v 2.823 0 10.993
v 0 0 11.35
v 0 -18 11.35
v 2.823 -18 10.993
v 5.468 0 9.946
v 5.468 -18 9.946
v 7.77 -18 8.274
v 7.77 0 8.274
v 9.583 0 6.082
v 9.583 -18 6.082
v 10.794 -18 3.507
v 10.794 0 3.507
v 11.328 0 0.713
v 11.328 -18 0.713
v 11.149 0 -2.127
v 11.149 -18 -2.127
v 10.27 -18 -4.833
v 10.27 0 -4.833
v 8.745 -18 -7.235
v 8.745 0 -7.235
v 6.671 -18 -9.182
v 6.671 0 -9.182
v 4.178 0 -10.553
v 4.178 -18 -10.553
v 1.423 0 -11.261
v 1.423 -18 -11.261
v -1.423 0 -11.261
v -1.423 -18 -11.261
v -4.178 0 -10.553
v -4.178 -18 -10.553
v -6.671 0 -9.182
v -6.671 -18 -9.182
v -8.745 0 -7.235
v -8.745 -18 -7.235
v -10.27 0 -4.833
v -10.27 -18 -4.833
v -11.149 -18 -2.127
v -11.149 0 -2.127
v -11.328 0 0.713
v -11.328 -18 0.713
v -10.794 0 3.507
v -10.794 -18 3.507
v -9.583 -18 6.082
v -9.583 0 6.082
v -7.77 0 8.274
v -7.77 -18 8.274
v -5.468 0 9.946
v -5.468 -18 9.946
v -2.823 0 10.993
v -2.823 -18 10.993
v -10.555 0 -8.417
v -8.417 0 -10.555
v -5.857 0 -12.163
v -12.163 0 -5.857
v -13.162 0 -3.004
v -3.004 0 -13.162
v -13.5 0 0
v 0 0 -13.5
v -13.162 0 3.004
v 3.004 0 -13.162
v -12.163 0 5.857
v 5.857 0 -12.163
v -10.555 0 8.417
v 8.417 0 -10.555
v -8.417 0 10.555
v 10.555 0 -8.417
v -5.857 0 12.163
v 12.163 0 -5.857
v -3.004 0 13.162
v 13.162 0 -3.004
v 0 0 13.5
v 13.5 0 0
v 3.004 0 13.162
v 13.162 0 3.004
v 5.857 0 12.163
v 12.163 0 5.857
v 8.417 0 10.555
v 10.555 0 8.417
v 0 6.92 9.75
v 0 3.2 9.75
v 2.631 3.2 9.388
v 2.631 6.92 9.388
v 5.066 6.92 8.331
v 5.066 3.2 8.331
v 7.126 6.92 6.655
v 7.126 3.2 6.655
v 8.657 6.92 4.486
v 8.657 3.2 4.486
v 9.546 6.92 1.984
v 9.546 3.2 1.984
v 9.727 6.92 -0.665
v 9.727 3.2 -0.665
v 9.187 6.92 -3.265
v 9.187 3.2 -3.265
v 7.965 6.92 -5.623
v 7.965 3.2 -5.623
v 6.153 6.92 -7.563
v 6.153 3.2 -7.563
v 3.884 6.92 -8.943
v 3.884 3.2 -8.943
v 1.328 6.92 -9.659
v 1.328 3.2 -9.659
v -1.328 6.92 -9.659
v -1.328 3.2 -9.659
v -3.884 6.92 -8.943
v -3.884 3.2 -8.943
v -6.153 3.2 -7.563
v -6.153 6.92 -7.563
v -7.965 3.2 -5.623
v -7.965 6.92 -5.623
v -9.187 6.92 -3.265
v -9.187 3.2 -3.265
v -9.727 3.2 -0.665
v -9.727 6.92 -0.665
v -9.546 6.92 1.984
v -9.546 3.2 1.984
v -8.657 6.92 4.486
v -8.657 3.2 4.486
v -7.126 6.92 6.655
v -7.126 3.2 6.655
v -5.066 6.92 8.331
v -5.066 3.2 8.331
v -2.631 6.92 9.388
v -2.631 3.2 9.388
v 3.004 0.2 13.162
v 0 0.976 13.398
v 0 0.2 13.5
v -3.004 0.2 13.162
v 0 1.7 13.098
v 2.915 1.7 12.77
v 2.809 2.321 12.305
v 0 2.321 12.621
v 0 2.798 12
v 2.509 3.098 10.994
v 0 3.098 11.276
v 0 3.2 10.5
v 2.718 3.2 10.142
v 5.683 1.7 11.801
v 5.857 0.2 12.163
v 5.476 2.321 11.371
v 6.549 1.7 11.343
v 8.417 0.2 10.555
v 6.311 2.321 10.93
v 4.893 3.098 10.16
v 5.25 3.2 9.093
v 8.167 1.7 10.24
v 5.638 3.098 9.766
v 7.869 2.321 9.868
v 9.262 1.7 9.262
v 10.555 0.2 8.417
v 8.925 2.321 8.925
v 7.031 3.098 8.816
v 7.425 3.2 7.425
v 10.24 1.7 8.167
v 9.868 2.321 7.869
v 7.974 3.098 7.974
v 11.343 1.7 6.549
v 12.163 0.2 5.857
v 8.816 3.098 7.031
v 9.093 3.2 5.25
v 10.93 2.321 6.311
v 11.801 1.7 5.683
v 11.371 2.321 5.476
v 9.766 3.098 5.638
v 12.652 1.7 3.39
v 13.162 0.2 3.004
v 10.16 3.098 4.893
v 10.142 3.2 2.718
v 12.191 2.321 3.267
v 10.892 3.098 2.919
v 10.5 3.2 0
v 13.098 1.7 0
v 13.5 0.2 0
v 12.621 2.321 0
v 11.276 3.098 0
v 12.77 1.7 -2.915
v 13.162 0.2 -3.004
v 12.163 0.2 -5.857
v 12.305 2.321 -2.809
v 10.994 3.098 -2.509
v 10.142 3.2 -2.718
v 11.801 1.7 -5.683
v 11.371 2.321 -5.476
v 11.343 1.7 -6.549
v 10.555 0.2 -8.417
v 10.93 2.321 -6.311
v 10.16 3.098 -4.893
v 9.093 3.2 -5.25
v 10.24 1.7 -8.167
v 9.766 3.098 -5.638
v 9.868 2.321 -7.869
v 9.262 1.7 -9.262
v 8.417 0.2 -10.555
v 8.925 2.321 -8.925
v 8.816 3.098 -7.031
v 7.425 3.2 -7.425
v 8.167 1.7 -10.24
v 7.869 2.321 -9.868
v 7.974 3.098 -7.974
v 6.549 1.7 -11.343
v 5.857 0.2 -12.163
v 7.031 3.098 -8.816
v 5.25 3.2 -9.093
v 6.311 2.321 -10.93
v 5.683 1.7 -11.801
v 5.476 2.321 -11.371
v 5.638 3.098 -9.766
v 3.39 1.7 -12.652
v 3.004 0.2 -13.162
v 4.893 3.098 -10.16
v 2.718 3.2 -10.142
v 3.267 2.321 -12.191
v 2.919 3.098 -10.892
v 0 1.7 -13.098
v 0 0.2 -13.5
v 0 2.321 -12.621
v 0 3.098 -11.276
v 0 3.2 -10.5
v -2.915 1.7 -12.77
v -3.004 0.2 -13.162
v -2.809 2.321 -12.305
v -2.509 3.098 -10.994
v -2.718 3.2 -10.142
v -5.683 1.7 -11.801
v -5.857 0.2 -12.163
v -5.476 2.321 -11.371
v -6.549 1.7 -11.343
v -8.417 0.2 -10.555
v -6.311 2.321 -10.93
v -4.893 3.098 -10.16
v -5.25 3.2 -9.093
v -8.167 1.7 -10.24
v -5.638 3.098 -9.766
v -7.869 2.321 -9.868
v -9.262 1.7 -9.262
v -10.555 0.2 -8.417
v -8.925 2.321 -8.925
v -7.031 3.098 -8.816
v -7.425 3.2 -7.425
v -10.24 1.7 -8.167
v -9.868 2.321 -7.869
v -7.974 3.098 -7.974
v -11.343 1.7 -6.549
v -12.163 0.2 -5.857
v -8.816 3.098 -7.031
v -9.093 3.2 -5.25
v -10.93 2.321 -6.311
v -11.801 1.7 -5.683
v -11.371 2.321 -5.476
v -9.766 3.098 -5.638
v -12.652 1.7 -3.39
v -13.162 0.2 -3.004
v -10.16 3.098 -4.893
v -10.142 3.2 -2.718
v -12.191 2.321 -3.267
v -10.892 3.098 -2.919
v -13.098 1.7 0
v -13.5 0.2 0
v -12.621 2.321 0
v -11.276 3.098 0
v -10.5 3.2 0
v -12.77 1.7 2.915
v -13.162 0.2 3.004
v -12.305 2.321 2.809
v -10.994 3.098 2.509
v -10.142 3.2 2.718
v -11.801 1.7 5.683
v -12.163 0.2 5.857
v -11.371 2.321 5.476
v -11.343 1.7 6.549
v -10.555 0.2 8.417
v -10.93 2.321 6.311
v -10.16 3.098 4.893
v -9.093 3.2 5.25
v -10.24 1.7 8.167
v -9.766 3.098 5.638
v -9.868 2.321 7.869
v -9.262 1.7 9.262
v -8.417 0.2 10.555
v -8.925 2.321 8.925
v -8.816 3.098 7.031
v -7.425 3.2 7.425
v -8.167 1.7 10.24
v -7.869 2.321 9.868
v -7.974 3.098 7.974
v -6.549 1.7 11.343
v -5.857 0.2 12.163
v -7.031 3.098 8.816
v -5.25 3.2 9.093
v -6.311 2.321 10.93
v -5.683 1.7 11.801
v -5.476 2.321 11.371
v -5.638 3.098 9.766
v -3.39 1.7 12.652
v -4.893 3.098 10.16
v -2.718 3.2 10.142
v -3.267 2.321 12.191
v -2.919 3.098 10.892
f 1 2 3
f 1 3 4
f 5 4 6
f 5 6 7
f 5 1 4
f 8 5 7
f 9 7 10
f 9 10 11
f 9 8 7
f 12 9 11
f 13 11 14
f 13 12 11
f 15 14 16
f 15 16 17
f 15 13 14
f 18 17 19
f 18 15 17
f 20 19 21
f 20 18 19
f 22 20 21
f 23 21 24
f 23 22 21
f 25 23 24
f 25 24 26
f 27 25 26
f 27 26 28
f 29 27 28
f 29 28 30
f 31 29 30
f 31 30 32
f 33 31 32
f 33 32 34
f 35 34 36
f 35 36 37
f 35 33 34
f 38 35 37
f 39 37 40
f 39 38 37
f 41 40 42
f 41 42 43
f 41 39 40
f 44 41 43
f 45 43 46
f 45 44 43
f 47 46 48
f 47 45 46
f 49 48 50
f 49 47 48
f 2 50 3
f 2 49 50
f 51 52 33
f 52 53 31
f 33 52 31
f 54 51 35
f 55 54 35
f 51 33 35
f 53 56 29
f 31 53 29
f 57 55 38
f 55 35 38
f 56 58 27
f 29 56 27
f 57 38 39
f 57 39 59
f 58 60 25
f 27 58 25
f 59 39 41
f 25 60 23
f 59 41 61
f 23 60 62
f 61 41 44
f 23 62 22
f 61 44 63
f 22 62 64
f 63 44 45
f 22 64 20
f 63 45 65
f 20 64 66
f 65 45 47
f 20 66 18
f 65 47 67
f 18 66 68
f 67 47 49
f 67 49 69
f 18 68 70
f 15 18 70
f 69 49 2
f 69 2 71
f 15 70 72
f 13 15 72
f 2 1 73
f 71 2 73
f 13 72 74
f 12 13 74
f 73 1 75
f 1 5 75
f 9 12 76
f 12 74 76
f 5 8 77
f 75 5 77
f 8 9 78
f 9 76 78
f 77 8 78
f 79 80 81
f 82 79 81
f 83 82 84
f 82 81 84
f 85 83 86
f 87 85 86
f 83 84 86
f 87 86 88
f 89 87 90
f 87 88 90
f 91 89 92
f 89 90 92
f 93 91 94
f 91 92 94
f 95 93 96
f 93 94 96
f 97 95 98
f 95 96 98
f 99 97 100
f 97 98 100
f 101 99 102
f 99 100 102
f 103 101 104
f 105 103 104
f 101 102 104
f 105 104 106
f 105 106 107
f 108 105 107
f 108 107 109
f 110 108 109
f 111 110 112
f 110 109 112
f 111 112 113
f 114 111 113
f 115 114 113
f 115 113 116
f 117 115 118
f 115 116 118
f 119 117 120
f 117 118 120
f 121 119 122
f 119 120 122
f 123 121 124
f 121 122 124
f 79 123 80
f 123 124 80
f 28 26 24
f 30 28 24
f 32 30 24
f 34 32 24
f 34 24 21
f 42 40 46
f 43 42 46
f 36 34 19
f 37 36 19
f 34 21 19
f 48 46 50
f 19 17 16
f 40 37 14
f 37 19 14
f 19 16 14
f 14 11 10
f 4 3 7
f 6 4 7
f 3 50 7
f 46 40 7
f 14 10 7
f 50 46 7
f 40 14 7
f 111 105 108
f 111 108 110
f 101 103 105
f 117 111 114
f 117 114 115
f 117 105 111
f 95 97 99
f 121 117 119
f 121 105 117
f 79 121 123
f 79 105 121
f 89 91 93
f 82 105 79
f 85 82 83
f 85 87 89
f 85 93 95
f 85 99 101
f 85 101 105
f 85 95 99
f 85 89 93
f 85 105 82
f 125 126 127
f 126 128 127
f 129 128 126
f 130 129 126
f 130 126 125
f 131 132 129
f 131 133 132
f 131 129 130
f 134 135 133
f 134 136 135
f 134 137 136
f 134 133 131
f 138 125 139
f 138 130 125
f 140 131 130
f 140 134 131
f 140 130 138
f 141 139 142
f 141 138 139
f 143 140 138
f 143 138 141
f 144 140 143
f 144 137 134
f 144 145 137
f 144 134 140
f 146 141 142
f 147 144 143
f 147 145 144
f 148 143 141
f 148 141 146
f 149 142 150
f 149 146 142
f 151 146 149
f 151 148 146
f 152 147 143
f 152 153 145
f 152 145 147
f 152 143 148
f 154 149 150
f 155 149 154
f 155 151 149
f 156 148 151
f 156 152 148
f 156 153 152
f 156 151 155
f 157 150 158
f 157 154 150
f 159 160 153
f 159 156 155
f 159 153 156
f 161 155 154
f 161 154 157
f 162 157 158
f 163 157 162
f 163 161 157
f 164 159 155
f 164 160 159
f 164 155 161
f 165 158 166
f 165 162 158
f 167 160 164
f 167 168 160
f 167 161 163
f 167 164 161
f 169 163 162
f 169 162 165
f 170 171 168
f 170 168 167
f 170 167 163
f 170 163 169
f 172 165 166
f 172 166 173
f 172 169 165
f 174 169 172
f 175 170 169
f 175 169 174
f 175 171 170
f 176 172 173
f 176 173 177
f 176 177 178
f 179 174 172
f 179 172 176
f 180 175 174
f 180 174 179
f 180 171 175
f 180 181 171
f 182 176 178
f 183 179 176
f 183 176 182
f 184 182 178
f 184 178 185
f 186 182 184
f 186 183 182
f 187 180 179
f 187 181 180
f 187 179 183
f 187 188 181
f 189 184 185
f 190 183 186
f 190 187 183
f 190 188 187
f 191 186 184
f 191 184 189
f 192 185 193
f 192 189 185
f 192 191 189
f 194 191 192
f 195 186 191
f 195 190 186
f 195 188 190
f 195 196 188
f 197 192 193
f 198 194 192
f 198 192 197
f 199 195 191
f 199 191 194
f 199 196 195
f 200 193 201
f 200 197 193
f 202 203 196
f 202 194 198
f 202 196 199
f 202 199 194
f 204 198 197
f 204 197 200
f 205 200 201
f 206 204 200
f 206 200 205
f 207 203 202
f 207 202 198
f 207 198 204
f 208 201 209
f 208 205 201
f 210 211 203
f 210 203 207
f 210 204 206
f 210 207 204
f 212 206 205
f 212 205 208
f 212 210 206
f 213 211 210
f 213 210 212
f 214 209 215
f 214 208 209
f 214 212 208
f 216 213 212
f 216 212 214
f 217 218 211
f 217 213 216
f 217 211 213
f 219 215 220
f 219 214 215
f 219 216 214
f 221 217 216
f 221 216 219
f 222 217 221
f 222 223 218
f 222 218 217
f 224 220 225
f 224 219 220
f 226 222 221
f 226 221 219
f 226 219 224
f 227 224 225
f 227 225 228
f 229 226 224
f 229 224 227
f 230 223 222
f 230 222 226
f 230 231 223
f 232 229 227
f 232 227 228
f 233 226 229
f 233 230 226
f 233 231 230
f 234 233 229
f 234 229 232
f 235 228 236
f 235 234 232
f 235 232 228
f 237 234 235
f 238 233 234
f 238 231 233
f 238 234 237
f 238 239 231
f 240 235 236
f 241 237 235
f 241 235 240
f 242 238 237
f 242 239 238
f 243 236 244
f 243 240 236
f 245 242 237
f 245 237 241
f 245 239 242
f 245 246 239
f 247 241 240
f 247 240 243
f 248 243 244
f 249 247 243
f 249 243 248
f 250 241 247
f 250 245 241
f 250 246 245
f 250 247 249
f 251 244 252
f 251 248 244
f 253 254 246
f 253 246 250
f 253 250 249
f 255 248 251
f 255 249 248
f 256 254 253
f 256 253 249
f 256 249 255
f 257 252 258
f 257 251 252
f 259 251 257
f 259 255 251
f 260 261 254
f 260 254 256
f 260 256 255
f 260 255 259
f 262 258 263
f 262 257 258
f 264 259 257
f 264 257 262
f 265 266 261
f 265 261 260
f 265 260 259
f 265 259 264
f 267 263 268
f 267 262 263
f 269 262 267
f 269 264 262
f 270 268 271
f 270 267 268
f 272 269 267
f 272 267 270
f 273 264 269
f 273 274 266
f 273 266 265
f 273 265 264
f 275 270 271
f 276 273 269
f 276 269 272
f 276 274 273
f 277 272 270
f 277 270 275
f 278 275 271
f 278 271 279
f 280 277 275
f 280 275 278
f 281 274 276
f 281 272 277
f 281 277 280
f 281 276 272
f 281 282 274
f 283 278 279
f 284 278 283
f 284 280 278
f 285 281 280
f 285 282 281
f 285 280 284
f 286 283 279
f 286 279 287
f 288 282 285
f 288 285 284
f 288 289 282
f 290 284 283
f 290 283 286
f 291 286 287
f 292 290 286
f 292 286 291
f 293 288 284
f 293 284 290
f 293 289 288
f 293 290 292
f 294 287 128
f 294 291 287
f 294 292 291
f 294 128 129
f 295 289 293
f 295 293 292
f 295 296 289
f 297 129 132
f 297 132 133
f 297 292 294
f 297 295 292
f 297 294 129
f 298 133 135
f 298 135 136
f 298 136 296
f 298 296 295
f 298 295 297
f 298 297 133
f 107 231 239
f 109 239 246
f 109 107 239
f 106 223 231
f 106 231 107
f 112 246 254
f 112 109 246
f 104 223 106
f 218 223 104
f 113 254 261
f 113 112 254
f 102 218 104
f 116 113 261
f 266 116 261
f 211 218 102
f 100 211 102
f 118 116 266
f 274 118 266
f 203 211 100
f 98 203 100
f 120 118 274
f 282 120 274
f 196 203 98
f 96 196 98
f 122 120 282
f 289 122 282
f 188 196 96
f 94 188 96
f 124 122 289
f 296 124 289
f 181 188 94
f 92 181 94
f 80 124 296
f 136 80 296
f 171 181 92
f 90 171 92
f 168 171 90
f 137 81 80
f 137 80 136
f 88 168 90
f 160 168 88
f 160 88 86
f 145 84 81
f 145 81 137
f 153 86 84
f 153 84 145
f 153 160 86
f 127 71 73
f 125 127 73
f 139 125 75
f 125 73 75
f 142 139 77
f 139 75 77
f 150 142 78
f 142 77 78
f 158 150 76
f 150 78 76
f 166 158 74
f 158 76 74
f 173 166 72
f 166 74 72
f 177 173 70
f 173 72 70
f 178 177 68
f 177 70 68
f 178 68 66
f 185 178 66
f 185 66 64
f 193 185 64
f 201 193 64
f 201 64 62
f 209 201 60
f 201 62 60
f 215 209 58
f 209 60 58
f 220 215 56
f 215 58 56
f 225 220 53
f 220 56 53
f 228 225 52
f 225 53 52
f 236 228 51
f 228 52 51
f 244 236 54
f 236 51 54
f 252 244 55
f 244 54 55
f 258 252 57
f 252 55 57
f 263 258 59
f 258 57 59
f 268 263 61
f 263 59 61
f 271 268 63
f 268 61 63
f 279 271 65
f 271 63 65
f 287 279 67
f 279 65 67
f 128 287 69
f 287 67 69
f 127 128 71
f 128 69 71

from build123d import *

# Parameters (mm, degrees)
SKETCH1_R           = 11.35
BOSS_EXTRUDE1_DEPTH = 18
SKETCH2_R           = 13.5
BOSS_EXTRUDE2_DEPTH = 3.2
FILLET1_R           = 3
SKETCH3_R           = 9.75
BOSS_EXTRUDE3_DEPTH = 3.72


with BuildPart() as part:
    # Sketch1 → Boss-Extrude1 (new body)
    with BuildSketch(Plane(origin=(0, 0, 0), x_dir=(1, 0, 0), z_dir=(0, 1, 0))):
        with Locations(Location((0, 0, 0), (0, 0, 270))):
            Circle(SKETCH1_R)
    extrude(amount=-BOSS_EXTRUDE1_DEPTH)

    # Sketch2 → Boss-Extrude2 (add)
    with BuildSketch(Plane(origin=(0, 0, 0), x_dir=(1, 0, 0), z_dir=(0, 1, 0))):
        with Locations(Location((0, 0, 0), (0, 0, 270))):
            Circle(SKETCH2_R)
    extrude(amount=BOSS_EXTRUDE2_DEPTH)

    # Fillet1
    fillet1_edges = [part.edges().sort_by_distance(p)[0] for p in [
        (0, 3.2, -13.5),
    ]]
    fillet(fillet1_edges, radius=FILLET1_R)

    # Sketch3 → Boss-Extrude3 (add)
    with BuildSketch(Plane(origin=(0, 3.2, 0), x_dir=(1, 0, 0), z_dir=(0, 1, 0))):
        with Locations(Location((0, 0, 0), (0, 0, 270))):
            Circle(SKETCH3_R)
    extrude(amount=BOSS_EXTRUDE3_DEPTH)


solid = part.part
